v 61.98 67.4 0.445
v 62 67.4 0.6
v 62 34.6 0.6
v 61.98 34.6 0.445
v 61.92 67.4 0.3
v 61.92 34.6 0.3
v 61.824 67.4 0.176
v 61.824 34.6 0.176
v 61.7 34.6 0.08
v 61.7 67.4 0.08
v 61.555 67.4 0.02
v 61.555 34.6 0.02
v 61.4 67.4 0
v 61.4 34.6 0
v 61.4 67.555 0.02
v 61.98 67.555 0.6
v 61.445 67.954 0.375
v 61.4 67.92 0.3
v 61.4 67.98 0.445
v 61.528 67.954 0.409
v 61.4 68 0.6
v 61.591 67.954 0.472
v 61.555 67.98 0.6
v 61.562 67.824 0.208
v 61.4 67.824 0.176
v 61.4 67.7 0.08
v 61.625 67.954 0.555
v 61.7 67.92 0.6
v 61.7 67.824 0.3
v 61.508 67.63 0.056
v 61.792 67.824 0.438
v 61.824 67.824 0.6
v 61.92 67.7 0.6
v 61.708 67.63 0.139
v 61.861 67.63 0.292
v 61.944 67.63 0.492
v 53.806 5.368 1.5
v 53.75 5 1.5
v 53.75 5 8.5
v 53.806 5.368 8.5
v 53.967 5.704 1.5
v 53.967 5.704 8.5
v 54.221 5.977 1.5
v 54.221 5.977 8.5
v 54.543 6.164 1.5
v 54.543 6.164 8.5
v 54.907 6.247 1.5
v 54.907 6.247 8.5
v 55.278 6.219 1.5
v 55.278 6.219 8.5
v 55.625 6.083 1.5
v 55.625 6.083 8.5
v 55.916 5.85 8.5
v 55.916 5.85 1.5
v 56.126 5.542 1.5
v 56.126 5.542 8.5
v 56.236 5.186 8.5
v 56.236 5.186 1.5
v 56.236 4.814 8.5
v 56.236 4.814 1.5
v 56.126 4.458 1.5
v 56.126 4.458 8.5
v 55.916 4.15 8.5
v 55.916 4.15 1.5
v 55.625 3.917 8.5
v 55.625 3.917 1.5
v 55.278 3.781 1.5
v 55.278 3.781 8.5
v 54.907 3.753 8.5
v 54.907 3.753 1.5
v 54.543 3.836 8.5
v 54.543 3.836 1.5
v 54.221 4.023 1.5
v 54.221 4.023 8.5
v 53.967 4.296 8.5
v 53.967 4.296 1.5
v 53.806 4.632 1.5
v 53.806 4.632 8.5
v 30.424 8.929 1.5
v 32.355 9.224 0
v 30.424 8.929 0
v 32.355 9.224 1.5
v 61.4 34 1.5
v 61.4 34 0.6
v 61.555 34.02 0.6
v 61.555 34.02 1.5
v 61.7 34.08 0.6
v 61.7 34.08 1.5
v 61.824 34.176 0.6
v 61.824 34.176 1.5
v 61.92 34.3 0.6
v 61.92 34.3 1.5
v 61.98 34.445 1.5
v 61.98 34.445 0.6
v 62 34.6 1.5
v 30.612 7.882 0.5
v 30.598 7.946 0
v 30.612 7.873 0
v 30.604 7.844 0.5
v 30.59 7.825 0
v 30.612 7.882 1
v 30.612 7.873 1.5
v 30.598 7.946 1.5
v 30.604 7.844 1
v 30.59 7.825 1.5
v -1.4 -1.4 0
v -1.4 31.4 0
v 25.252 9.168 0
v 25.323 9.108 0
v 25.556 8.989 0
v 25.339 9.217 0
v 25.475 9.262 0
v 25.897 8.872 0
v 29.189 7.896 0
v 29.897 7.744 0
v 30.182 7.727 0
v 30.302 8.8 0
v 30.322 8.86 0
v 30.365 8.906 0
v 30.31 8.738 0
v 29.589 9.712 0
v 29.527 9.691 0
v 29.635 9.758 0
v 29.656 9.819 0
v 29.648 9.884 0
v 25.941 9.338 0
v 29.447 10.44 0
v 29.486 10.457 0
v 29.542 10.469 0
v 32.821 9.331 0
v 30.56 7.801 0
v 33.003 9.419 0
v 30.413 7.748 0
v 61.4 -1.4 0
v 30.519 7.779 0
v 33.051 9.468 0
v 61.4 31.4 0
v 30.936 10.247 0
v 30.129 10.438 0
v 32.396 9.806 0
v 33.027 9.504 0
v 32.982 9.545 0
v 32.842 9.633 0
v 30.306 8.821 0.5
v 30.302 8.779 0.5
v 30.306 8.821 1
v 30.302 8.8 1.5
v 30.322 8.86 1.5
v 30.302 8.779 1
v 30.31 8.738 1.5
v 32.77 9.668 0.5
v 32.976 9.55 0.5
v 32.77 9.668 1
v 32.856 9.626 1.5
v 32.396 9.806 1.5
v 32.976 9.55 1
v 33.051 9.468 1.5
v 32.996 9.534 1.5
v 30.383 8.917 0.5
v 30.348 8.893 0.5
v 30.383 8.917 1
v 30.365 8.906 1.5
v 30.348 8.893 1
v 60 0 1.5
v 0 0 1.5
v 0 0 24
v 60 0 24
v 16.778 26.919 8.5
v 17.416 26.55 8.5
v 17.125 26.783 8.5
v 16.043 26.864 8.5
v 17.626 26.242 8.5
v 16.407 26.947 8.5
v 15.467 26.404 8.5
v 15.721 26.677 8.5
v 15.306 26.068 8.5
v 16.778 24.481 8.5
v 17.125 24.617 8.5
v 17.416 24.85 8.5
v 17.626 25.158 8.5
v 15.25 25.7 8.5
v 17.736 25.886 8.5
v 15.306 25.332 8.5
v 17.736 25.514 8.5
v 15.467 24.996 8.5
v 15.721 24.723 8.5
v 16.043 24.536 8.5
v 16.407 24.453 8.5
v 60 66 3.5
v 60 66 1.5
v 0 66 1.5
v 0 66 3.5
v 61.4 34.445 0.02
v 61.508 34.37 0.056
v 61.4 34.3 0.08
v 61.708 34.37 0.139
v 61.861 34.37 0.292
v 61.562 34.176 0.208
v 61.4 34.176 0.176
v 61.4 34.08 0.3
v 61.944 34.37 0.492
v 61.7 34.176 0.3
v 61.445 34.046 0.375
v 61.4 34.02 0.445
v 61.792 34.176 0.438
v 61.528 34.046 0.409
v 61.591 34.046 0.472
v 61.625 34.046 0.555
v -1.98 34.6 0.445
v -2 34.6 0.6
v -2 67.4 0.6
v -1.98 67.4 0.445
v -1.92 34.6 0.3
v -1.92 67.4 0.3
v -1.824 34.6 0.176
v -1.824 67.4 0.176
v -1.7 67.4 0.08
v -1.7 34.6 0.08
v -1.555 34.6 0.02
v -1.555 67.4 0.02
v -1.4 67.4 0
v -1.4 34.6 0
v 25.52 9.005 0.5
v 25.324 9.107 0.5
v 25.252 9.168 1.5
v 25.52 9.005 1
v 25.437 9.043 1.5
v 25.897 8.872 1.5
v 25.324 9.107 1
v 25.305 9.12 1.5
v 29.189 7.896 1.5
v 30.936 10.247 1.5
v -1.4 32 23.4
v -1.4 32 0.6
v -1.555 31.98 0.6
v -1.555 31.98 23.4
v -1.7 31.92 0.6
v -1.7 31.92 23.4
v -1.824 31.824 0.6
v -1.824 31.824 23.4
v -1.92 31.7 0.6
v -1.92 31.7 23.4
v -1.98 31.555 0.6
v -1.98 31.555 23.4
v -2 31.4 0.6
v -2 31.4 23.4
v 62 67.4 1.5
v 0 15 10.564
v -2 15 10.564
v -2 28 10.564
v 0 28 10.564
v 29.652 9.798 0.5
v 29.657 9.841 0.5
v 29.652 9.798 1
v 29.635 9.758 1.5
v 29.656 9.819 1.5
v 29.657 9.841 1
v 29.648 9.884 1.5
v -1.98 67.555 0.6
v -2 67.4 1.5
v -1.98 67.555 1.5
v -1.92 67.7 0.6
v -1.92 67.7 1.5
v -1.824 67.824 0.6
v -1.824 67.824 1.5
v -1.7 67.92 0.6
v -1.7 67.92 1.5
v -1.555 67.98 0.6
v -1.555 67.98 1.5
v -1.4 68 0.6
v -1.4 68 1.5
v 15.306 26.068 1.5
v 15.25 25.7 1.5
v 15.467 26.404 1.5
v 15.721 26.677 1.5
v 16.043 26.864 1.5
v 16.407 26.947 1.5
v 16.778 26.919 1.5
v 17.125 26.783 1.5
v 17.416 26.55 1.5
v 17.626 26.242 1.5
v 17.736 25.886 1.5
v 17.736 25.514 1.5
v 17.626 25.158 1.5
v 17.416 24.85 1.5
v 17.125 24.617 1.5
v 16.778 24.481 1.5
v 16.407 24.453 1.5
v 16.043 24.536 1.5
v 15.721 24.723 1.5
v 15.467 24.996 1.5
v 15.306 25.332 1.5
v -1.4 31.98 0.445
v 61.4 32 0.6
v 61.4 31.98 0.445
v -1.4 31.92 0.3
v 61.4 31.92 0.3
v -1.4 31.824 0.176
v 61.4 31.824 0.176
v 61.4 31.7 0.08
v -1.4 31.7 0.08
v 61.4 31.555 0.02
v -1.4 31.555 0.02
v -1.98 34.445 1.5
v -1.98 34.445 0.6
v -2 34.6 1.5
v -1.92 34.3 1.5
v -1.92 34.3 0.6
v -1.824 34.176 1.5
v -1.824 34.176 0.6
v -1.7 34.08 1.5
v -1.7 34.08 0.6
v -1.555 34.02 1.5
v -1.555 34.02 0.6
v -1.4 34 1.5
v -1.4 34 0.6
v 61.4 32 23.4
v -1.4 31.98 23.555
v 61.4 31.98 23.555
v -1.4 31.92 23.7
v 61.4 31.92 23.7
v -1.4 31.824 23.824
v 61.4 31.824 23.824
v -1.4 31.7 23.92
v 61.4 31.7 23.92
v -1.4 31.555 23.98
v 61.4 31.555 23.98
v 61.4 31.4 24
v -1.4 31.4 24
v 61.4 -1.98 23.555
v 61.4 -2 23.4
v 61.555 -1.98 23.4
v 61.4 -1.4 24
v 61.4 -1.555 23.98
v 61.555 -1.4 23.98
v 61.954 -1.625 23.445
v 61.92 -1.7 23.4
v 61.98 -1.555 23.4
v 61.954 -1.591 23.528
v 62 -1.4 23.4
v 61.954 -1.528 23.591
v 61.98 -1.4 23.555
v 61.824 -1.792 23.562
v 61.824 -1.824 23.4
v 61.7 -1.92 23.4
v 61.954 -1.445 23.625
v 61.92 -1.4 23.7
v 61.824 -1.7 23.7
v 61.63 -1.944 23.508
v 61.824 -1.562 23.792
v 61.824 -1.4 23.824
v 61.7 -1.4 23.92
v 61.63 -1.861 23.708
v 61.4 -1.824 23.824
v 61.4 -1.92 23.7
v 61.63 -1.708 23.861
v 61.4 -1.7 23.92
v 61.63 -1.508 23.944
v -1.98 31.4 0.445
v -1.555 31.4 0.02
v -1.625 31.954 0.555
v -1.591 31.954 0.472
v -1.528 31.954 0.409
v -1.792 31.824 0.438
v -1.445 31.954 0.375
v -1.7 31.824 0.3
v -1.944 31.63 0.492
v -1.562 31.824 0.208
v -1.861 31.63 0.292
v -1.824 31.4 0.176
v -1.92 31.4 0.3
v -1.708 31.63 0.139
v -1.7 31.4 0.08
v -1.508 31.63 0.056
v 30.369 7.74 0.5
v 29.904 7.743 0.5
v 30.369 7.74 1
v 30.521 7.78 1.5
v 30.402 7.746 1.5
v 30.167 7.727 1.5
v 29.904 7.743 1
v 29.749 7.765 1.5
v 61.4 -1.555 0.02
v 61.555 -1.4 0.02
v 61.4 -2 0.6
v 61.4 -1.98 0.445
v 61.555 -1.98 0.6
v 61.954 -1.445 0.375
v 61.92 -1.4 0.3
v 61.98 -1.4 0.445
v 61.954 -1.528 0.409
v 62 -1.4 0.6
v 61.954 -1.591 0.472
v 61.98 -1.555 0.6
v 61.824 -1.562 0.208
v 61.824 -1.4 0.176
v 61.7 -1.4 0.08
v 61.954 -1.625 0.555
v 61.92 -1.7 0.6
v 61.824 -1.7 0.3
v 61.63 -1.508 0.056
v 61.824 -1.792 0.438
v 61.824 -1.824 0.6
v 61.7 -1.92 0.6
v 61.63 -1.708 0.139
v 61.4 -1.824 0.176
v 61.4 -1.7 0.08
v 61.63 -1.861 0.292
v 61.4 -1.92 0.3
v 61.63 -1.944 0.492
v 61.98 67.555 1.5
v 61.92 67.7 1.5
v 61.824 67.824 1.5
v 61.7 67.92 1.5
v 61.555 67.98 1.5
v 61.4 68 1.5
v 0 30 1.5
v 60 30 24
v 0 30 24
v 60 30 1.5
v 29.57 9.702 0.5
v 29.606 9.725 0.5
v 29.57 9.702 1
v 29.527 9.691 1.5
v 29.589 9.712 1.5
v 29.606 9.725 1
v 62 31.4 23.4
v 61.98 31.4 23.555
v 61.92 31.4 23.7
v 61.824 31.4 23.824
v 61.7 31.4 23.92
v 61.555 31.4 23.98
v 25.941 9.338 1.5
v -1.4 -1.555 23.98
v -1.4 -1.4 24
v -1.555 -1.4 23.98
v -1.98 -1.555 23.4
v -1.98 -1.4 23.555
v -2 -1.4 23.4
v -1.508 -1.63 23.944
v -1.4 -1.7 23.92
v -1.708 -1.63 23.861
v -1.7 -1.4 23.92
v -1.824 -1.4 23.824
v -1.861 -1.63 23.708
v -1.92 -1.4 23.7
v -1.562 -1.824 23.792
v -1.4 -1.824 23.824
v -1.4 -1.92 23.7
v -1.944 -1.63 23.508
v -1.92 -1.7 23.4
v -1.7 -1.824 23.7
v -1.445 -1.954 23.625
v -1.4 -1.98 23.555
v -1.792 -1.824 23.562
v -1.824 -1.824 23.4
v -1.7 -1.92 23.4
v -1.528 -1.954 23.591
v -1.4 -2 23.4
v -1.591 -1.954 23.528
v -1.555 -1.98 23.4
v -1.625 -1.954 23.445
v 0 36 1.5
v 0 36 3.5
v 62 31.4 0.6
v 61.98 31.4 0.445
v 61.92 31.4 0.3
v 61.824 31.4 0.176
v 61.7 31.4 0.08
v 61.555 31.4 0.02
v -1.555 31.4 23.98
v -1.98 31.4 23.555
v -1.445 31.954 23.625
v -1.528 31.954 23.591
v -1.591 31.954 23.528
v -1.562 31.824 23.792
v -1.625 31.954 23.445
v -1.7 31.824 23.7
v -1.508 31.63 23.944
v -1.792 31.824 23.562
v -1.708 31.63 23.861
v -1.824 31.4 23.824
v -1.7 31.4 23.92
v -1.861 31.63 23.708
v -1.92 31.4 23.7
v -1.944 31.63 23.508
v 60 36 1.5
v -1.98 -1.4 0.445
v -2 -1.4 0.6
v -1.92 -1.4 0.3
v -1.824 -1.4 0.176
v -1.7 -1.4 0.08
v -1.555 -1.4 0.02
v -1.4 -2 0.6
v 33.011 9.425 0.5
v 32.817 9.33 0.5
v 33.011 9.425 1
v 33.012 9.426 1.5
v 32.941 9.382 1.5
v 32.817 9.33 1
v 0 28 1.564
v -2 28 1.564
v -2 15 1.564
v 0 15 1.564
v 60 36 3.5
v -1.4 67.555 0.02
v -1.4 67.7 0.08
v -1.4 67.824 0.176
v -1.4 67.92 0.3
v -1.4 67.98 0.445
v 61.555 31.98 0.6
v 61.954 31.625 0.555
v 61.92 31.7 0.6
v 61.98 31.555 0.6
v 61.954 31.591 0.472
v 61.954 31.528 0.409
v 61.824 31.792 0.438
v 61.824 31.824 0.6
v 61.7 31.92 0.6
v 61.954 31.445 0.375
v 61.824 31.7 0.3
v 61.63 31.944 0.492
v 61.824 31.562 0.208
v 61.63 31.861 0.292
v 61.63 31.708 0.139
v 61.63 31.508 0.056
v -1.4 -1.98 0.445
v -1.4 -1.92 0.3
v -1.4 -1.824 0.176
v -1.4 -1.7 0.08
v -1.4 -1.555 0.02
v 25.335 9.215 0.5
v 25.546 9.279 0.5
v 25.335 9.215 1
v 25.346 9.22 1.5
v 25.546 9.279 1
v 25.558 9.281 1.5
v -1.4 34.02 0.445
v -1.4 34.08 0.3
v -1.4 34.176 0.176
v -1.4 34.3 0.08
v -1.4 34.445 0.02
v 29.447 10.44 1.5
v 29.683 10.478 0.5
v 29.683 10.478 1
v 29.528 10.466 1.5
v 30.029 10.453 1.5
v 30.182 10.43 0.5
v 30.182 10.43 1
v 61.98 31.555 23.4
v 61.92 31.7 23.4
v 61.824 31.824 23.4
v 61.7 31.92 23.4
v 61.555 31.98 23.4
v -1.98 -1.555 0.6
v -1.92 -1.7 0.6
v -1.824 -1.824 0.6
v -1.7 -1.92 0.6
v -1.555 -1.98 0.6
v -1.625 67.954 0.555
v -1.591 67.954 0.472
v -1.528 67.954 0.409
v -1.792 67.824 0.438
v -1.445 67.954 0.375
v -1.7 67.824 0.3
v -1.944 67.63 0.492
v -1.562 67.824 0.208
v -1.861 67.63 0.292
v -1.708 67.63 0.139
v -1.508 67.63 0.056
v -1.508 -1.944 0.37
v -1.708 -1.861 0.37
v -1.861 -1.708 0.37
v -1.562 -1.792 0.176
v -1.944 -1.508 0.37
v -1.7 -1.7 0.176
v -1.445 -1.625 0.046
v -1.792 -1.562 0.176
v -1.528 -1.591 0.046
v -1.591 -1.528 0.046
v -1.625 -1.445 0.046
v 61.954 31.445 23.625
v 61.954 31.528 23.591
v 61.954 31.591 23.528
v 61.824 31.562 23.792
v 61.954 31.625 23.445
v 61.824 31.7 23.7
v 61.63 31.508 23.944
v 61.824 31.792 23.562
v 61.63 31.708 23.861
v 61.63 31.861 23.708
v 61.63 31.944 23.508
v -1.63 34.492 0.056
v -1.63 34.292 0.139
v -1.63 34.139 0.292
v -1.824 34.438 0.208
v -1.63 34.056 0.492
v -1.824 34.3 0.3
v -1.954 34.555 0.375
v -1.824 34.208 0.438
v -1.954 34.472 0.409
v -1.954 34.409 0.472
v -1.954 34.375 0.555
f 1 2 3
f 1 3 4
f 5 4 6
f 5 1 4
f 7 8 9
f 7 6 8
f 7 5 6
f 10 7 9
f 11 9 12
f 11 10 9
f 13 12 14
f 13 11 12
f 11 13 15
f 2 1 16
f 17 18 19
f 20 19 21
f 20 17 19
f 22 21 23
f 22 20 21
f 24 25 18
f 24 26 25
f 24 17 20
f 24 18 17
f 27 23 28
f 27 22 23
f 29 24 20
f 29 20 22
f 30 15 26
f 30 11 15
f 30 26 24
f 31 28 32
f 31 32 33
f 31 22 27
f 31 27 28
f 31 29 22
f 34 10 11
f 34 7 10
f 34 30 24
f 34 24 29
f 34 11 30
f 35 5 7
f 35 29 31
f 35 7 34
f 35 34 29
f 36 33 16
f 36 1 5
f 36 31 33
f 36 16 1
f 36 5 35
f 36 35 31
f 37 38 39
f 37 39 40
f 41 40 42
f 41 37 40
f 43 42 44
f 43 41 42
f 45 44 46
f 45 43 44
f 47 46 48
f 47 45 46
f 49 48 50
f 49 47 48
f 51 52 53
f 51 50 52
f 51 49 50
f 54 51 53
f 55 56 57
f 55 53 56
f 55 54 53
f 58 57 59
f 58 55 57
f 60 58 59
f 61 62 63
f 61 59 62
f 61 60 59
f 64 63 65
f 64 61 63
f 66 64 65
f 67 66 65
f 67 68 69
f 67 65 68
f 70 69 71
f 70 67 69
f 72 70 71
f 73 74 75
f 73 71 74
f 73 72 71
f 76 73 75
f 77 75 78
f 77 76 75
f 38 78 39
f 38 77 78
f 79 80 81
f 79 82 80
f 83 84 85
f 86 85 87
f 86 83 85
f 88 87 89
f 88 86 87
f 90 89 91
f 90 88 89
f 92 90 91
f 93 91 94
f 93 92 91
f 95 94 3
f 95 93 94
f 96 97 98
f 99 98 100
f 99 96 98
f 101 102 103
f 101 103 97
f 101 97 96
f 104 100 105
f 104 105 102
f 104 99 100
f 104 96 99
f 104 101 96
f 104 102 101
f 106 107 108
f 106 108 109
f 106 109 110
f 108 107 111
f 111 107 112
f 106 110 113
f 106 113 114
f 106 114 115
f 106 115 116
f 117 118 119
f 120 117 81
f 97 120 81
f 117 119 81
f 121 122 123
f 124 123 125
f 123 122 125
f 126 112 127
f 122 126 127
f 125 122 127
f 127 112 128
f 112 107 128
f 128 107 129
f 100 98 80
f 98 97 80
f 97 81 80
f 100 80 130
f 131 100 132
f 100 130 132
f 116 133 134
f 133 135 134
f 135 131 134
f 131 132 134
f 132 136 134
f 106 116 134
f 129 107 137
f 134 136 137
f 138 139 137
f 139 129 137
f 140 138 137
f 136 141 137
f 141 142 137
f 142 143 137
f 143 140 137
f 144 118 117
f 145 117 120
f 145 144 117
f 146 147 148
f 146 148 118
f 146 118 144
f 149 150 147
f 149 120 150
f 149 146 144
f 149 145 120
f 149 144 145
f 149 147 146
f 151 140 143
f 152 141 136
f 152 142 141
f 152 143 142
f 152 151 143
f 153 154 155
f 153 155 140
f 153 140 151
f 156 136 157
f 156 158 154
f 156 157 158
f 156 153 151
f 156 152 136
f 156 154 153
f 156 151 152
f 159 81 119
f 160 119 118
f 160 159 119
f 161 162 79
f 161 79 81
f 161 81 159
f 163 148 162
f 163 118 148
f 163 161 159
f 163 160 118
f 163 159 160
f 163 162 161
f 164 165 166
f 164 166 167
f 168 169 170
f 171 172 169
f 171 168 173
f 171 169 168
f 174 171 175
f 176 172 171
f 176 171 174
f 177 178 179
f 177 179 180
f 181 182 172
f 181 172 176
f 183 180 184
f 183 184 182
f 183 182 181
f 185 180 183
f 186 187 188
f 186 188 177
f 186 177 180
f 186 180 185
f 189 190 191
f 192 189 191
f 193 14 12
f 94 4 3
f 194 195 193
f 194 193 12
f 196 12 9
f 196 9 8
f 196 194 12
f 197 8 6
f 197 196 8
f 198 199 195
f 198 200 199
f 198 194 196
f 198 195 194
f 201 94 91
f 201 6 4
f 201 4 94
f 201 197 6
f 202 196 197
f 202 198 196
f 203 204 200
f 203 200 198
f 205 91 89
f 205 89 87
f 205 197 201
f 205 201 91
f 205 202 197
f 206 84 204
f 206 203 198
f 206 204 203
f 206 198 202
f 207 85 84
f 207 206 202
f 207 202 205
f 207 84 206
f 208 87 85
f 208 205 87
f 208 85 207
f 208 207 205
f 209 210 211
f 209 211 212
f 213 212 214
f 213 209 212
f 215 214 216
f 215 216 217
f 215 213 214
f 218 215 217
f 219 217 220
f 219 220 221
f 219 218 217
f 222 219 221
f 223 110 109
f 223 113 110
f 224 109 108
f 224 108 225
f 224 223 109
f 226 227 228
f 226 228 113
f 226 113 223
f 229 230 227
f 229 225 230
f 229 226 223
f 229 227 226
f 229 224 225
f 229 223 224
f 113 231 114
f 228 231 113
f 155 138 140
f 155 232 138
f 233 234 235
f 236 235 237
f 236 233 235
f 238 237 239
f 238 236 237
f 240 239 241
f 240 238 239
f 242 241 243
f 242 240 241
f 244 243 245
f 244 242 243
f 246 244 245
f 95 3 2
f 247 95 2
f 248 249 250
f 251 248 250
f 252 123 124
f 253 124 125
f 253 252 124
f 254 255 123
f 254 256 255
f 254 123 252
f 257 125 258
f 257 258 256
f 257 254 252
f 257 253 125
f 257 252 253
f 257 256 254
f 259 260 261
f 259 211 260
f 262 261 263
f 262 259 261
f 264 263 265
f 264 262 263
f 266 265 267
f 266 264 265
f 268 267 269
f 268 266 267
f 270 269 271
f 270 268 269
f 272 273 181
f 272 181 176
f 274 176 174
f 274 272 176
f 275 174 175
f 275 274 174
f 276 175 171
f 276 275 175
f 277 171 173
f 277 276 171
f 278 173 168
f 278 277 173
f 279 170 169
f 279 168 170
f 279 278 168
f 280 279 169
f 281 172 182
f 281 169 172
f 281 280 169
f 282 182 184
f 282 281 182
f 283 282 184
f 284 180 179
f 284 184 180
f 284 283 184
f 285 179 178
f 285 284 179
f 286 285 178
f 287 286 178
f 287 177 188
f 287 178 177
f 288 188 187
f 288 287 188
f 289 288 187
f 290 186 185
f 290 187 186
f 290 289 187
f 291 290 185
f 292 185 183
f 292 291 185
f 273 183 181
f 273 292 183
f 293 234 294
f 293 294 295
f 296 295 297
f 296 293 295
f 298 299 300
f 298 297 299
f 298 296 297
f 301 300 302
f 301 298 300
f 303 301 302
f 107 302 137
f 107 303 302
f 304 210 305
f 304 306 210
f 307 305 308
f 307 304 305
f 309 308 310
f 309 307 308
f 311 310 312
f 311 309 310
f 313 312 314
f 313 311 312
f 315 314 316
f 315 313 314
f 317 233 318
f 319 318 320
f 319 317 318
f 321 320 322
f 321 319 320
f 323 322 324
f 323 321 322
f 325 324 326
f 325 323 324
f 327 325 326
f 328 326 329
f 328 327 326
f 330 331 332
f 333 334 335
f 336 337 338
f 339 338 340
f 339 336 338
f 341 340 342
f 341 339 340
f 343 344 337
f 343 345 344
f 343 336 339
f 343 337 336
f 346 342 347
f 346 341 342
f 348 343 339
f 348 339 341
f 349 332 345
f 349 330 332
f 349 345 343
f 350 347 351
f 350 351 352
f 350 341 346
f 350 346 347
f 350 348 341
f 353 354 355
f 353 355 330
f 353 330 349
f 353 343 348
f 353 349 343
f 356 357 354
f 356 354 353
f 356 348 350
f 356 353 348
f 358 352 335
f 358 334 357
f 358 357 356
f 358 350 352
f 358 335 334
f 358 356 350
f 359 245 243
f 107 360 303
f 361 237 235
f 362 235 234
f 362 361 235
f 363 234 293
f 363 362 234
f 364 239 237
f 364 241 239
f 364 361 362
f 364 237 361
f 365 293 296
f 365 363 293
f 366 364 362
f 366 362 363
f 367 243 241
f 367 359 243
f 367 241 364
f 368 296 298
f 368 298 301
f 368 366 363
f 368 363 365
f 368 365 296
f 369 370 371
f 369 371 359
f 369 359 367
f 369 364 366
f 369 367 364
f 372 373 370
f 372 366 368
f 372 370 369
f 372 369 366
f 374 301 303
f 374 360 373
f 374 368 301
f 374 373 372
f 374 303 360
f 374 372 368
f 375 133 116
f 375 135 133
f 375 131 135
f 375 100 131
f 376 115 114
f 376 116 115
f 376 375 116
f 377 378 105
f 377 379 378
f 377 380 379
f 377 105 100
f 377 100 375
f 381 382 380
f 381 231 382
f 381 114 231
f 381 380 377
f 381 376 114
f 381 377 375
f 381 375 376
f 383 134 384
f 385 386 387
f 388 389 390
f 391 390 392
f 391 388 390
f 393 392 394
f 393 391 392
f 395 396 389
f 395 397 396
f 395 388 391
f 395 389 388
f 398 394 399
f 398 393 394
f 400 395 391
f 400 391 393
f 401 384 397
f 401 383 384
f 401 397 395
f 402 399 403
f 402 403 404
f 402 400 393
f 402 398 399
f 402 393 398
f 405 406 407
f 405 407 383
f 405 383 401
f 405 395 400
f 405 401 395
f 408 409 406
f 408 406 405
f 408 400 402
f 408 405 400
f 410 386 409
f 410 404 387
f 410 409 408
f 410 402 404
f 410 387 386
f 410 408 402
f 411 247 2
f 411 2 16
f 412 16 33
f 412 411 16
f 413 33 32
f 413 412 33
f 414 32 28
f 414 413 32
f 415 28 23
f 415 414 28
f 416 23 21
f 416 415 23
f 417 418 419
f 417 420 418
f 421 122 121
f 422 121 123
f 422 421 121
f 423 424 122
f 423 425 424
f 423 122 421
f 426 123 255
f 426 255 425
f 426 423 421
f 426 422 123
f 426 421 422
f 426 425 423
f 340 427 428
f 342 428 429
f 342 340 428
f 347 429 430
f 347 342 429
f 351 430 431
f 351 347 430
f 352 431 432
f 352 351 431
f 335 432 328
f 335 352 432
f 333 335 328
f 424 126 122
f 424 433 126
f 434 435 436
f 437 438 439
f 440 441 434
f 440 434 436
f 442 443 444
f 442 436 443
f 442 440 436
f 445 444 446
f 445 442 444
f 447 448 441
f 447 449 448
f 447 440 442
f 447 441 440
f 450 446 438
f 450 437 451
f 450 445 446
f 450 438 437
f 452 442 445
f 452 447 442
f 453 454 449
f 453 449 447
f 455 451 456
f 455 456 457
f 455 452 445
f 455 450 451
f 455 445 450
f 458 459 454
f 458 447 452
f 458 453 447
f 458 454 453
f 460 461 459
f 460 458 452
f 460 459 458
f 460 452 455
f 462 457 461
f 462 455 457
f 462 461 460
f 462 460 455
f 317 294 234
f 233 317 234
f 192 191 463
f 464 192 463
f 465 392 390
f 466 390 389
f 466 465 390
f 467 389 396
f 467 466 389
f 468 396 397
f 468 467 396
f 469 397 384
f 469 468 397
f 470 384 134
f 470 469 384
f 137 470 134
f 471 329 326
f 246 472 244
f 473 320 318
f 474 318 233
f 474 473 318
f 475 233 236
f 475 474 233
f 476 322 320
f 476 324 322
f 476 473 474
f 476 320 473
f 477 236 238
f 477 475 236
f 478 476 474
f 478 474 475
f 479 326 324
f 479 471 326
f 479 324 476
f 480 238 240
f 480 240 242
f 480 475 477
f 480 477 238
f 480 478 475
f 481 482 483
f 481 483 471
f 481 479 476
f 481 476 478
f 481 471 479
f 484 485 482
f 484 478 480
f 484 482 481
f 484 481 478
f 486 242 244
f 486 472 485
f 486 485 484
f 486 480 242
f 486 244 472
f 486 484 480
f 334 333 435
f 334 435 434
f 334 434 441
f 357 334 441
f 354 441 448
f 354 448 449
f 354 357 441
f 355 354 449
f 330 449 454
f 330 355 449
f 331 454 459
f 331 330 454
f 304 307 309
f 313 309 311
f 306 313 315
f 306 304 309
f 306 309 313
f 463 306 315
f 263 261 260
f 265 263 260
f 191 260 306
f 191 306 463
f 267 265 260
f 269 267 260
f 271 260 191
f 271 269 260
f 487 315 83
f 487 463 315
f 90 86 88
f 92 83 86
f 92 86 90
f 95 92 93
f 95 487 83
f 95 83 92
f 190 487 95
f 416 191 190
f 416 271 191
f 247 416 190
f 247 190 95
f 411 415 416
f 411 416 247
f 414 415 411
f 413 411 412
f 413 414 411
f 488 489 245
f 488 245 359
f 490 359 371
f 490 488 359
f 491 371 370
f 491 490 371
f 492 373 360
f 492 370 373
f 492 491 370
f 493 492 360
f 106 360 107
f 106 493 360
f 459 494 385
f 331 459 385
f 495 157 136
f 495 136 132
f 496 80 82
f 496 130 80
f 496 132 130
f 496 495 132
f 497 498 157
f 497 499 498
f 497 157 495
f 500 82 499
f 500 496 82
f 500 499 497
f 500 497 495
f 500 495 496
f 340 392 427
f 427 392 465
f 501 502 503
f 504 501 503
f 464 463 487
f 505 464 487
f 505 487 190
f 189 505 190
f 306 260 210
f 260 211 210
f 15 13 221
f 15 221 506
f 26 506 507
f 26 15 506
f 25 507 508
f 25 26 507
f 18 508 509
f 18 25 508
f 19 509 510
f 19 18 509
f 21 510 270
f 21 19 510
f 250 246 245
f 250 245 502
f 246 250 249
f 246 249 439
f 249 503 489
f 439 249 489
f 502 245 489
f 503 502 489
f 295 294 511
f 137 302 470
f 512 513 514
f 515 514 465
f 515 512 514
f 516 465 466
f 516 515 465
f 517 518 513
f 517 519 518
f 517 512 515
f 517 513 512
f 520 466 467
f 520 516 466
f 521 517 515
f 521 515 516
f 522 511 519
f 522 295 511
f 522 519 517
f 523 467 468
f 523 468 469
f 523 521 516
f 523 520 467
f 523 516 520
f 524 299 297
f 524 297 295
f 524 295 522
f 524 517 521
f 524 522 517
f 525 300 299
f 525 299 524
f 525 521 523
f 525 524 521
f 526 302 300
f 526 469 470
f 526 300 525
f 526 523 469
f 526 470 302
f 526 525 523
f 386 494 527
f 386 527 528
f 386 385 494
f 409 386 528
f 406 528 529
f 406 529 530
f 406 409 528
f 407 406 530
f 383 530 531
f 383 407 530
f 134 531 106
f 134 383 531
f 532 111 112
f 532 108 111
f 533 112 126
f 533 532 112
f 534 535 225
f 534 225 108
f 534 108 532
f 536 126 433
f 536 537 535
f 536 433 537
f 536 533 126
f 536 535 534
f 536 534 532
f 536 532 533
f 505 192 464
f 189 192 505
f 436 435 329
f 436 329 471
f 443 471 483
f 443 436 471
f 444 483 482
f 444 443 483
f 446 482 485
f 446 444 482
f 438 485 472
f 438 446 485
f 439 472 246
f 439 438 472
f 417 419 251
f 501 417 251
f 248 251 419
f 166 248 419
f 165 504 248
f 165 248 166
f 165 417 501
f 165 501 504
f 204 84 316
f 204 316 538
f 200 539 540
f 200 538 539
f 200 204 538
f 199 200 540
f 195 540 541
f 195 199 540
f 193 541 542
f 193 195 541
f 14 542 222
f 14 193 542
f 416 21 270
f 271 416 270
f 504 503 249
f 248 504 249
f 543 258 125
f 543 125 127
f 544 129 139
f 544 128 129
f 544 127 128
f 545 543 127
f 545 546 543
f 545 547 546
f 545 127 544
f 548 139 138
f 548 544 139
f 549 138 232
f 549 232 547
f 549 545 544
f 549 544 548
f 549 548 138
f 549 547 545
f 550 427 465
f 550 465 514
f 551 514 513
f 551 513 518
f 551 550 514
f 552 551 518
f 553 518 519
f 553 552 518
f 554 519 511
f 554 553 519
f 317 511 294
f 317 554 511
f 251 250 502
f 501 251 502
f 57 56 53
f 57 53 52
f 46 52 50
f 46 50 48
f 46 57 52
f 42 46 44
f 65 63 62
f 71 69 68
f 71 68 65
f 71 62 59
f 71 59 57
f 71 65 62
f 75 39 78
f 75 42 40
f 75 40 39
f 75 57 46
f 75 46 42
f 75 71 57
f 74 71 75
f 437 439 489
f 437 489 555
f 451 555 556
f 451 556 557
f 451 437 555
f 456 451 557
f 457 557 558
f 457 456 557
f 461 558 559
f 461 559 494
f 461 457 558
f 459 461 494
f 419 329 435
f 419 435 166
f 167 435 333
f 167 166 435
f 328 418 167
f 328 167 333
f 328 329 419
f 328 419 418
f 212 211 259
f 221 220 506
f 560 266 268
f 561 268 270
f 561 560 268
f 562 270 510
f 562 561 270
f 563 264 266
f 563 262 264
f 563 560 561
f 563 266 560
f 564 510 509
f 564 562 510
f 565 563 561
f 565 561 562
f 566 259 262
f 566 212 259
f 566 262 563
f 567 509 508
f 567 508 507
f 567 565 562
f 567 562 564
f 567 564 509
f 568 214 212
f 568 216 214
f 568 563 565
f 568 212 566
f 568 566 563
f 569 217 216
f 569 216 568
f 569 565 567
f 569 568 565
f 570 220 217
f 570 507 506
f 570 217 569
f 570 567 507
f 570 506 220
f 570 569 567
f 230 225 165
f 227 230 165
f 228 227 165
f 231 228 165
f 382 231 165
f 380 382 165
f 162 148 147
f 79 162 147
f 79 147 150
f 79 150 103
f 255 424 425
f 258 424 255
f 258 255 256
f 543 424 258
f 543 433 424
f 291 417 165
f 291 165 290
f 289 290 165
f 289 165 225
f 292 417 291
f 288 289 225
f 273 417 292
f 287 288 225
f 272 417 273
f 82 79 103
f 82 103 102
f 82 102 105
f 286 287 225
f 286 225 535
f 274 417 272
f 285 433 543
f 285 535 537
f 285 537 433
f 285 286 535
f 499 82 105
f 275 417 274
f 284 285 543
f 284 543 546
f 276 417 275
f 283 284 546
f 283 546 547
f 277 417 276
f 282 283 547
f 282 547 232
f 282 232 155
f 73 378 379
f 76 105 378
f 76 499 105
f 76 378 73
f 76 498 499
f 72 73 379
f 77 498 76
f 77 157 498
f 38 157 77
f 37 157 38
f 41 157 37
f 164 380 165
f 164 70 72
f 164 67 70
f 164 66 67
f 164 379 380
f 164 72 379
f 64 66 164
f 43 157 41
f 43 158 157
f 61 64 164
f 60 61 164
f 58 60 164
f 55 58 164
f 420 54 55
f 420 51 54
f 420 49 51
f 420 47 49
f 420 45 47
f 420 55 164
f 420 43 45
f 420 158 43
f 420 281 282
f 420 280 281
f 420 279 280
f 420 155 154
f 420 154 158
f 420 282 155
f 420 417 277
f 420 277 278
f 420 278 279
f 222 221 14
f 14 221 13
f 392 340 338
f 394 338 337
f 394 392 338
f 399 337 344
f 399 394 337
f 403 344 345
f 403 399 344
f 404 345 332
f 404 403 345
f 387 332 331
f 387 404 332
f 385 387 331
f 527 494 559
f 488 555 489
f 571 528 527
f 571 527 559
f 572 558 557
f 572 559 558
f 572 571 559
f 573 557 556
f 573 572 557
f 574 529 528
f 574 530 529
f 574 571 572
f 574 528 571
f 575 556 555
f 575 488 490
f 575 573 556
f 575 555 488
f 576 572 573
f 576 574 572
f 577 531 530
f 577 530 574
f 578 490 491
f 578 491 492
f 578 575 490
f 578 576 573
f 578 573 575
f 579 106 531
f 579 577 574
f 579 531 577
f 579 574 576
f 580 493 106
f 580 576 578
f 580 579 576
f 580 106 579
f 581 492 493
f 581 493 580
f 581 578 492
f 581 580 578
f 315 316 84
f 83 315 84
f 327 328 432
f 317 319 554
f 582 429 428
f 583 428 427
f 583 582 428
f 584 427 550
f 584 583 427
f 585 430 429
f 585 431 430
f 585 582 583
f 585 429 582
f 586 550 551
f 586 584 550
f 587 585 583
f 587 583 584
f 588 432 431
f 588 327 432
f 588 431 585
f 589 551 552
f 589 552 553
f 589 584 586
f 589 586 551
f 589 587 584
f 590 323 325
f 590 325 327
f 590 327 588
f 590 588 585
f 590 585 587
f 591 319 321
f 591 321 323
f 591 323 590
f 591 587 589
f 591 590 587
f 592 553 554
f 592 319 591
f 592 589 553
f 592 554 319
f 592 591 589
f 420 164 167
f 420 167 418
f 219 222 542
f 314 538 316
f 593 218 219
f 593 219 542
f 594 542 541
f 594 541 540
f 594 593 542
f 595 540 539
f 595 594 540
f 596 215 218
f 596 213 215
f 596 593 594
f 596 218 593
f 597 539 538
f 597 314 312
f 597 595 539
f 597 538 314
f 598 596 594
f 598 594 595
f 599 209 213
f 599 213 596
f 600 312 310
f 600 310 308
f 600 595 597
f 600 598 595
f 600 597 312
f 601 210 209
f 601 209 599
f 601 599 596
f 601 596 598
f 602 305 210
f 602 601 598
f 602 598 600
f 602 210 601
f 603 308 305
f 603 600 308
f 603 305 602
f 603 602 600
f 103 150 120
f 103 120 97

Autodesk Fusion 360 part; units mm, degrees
sketch "Sketch1" plane through (0, 0, 0) normal (0, 0, 1) x (1, 0, 0)
  line L0 (0, 0) -> (60, 0)
  line L1 (60, 0) -> (60, 30)
  line L2 (60, 30) -> (0, 30)
  line L3 (0, 30) -> (0, 0)
  line L4 (-2, -2) -> (62, -2)
  line L5 (62, -2) -> (62, 32)
  line L6 (62, 32) -> (-2, 32)
  line L7 (-2, 32) -> (-2, -2)
  dimension "d1" = 60
  dimension "d2" = 30
  dimension "d3" = 2
extrude "Extrude1" add sketch "Sketch1" along normal blind 1.5 contours L0 L1 L2 L3 makes body 1
extrude "Extrude2" add sketch "Sketch1" along normal blind 24 bodies 1
sketch "Sketch2" plane through (62, 0, 0) normal (1, 0, 0) x (0, 1, 0)
  line L0 (-2, 0) -> (32, 0)
  line L1 (32, 0) -> (32, 24)
  line L2 (32, 24) -> (-2, 24)
  line L3 (-2, 24) -> (-2, 0)
  point P0 (30, 1.5)
sketch "Sketch3" plane through (-2, 0, 0) normal (-1, 0, 0) x (0, -1, 0)
  line L0 (-32, 0) -> (2, 0)
  line L1 (2, 0) -> (2, 24)
  line L2 (2, 24) -> (-32, 24)
  line L3 (-32, 24) -> (-32, 0)
sketch "Sketch1 (2)" plane through (0, 0, 0) normal (0, 0, 1) x (1, 0, 0) in component "cover"
  line L0 (-2, 34) -> (62, 34)
  line L1 (62, 34) -> (62, 68)
  line L2 (62, 68) -> (-2, 68)
  line L3 (-2, 68) -> (-2, 34)
  line L4 (0, 36) -> (60, 36)
  line L5 (60, 36) -> (60, 66)
  line L6 (60, 66) -> (0, 66)
  line L7 (0, 66) -> (0, 36)
  dimension "d21" = 64
  dimension "d22" = 34
  dimension "d23" = -2
extrude "Extrude1'" add sketch "Sketch1 (2)" along normal blind 3.5 separate body contours L4 L5 L6 L7 makes body 2 in component "cover"
extrude "Extrude2'" add sketch "Sketch1 (2)" along normal blind 1.5 bodies 2 in component "cover"
sketch "Sketch4" plane through (0, 0, 0) normal (0, 0, 1) x (1, 0, 0)
  line L0 (-2, 34) -> (62, 34)
  line L1 (62, 34) -> (62, 68)
sketch "Sketch5" plane through (0, 0, 0) normal (0, 0, 1) x (1, 0, 0)
sketch "Sketch7" plane through (0, 0, 1.5) normal (0, 0, 1) x (-1, 0, 0)
  line L0 (0, -30) -> (0, 0)
  line L1 (0, 0) -> (-60, 0)
  line L2 (-60, 0) -> (-60, -30)
  line L3 (-60, -30) -> (0, -30)
  circle A0 centre (-55, -5) radius 1.25
  circle A1 centre (-16.5, -25.7) radius 1.25
  line L4 (2, -32) -> (2, 2)
  spline S0 degree 3 poles (-24.9969, -9.3105) (-24.9532, -9.2408) (-24.9445, -9.1603) (-24.9726, -9.0832) knots 0 0 0 0 1 1 1 1
  spline S1 degree 3 poles (-24.9726, -9.0832) (-25.0142, -8.969) (-25.1468, -8.7941) (-25.8151, -8.596) knots 0 0 0 0 1 1 1 1
  line L5 (-25.8151, -8.596) -> (-29.1072, -7.6203)
  spline S2 degree 3 poles (-29.1072, -7.6203) (-29.9325, -7.3756) (-30.5651, -7.3786) (-30.7999, -7.6281) knots 0 0 0 0 1 1 1 1
  spline S3 degree 3 poles (-30.7999, -7.6281) (-30.9023, -7.7369) (-30.9267, -7.8847) (-30.8687, -8.0441) knots 0 0 0 0 1 1 1 1
  line L6 (-30.8687, -8.0441) -> (-30.6404, -8.6715)
  line L7 (-30.6404, -8.6715) -> (-32.3981, -8.94)
  spline S4 degree 3 poles (-32.3981, -8.94) (-32.8976, -9.0165) (-33.1913, -9.1394) (-33.2959, -9.3156) knots 0 0 0 0 1 1 1 1
  spline S5 degree 3 poles (-33.2959, -9.3156) (-33.3423, -9.3939) (-33.3509, -9.4839) (-33.3201, -9.5687) knots 0 0 0 0 1 1 1 1
  spline S6 degree 3 poles (-33.3201, -9.5687) (-33.249, -9.7638) (-32.974, -9.9314) (-32.479, -10.0813) knots 0 0 0 0 1 1 1 1
  line L8 (-32.479, -10.0813) -> (-31.0194, -10.5228)
  spline S7 degree 3 poles (-31.0194, -10.5228) (-30.674, -10.6273) (-29.524, -10.9436) (-29.2271, -10.6298) knots 0 0 0 0 1 1 1 1
  spline S8 degree 3 poles (-29.2271, -10.6298) (-29.1554, -10.554) (-29.1364, -10.4495) (-29.175, -10.3435) knots 0 0 0 0 1 1 1 1
  line L9 (-29.175, -10.3435) -> (-29.3148, -9.9595)
  line L10 (-29.3148, -9.9595) -> (-25.9131, -9.6243)
  spline S9 degree 3 poles (-25.9131, -9.6243) (-25.2264, -9.5566) (-25.0614, -9.4128) (-24.9969, -9.3105) knots 0 0 0 0 1 1 1 1
  line L11 (-25.9412, -9.3379) -> (-29.5274, -9.6912)
  spline S10 degree 3 poles (-29.5274, -9.6912) (-29.5716, -9.6957) (-29.6114, -9.7201) (-29.635, -9.7578) knots 0 0 0 0 1 1 1 1
  spline S11 degree 3 poles (-29.635, -9.7578) (-29.6587, -9.7955) (-29.6637, -9.8419) (-29.6485, -9.8837) knots 0 0 0 0 1 1 1 1
  line L12 (-29.6485, -9.8837) -> (-29.4467, -10.4403)
  spline S12 degree 3 poles (-29.4467, -10.4403) (-29.5487, -10.5053) (-30.0567, -10.513) (-30.936, -10.2471) knots 0 0 0 0 1 1 1 1
  line L13 (-30.936, -10.2471) -> (-32.3955, -9.8056)
  spline S13 degree 3 poles (-32.3955, -9.8056) (-32.8674, -9.6629) (-33.0287, -9.5277) (-33.0508, -9.4675) knots 0 0 0 0 1 1 1 1
  spline S14 degree 3 poles (-33.0508, -9.4675) (-33.0504, -9.4659) (-32.9899, -9.3216) (-32.3548, -9.2244) knots 0 0 0 0 1 1 1 1
  line L14 (-32.3548, -9.2244) -> (-30.4236, -8.9293)
  spline S15 degree 3 poles (-30.4236, -8.9293) (-30.3809, -8.9228) (-30.3435, -8.8974) (-30.3215, -8.8605) knots 0 0 0 0 1 1 1 1
  spline S16 degree 3 poles (-30.3215, -8.8605) (-30.2997, -8.8234) (-30.2954, -8.7783) (-30.3101, -8.7379) knots 0 0 0 0 1 1 1 1
  line L15 (-30.3101, -8.7379) -> (-30.5984, -7.9457)
  spline S17 degree 3 poles (-30.5984, -7.9457) (-30.6278, -7.865) (-30.6026, -7.8384) (-30.5905, -7.8254) knots 0 0 0 0 1 1 1 1
  spline S18 degree 3 poles (-30.5905, -7.8254) (-30.4887, -7.7171) (-30.0313, -7.6465) (-29.1891, -7.8962) knots 0 0 0 0 1 1 1 1
  line L16 (-29.1891, -7.8962) -> (-25.8967, -8.8719)
  spline S19 degree 3 poles (-25.8967, -8.8719) (-25.4095, -9.0163) (-25.2824, -9.1307) (-25.2519, -9.1685) knots 0 0 0 0 1 1 1 1
  spline S20 degree 3 poles (-25.2519, -9.1685) (-25.289, -9.1998) (-25.4356, -9.288) (-25.9412, -9.3379) knots 0 0 0 0 1 1 1 1
  dimension "d35" = 2.5
  dimension "d36" = 2.5
  dimension "d52" = 18.5
extrude "Extrude12" cut sketch "Sketch7" against normal blind 2.5 contours L11 S10 S11 L12 S12 L13 S13 S14 L14 S15 S16 L15 S17 S18 L16 S19 S20 bodies 1
extrude "Extrude6" add sketch "Sketch7" along normal blind 7 contours A1 bodies 1
extrude "Extrude7" add sketch "Sketch7" along normal blind 7 contours A0 bodies 1
sketch "Sketch8" plane through (-2, 15, 12) normal (-1, 0, 0) x (0, -1, 0)
  line L0 (-13, -10.4362) -> (0, -10.4362)
  line L1 (0, -10.4362) -> (0, -1.4362)
  line L2 (0, -1.4362) -> (-13, -1.4362)
  line L3 (-13, -1.4362) -> (-13, -10.4362)
  point P0 (-17, -10.5)
  dimension "d47" = 13
  dimension "d48" = 9
  dimension "d57" = 4
extrude "Extrude10" cut sketch "Sketch8" against normal blind 2.5 bodies 1
fillet "Fillet1" radius 0.6 1 edges at (-2, 15, 24) on bodies 1
fillet "Fillet2" radius 0.6 3 edges at (-2, -2, 11.7) (-1.8243, -2, 23.8243) (30.3, -2, 24) on bodies 1
fillet "Fillet3" radius 0.6 3 edges at (-2, 15.3, 0) (-1.8243, -1.8243, 0) (30.3, -2, 0) on bodies 1
fillet "Fillet4" radius 0.6 5 edges at (30.3, 32, 0) (-1.8243, 32, 0.1757) (-2, 32, 12) (-1.8243, 32, 23.8243) (30.3, 32, 24) on bodies 1
fillet "Fillet5" radius 0.6 8 edges at (62, 31.8243, 23.8243) (62, 15, 24) (62, -1.8243, 23.8243) (62, -2, 12) (62, -1.8243, 0.1757) (62, 15, 0) (62, 31.8243, 0.1757) (62, 32, 12) on bodies 1
fillet "Fillet1'" radius 0.6 1 edges at (62, 51, 0) on bodies 2 in component "cover"
fillet "Fillet2'" radius 0.6 3 edges at (29.7, 34, 0) (61.8243, 34, 0.1757) (62, 34, 1.05) on bodies 2 in component "cover"
fillet "Fillet3'" radius 0.6 3 edges at (-2, 51.3, 0) (-2, 34.1757, 0.1757) (-2, 34, 1.05) on bodies 2 in component "cover"
fillet "Fillet4'" radius 0.6 5 edges at (62, 68, 1.05) (61.8243, 68, 0.1757) (30, 68, 0) (-1.8243, 68, 0.1757) (-2, 68, 1.05) on bodies 2 in component "cover"
sketch "Sketch9" plane through (0, 0, 1.5) normal (0, 0, 1) x (-1, 0, 0)
component "cover" placed x (1, 0, 0) y (0, 1, 0) z (0, 0, 1) at (0, 0, 0)
